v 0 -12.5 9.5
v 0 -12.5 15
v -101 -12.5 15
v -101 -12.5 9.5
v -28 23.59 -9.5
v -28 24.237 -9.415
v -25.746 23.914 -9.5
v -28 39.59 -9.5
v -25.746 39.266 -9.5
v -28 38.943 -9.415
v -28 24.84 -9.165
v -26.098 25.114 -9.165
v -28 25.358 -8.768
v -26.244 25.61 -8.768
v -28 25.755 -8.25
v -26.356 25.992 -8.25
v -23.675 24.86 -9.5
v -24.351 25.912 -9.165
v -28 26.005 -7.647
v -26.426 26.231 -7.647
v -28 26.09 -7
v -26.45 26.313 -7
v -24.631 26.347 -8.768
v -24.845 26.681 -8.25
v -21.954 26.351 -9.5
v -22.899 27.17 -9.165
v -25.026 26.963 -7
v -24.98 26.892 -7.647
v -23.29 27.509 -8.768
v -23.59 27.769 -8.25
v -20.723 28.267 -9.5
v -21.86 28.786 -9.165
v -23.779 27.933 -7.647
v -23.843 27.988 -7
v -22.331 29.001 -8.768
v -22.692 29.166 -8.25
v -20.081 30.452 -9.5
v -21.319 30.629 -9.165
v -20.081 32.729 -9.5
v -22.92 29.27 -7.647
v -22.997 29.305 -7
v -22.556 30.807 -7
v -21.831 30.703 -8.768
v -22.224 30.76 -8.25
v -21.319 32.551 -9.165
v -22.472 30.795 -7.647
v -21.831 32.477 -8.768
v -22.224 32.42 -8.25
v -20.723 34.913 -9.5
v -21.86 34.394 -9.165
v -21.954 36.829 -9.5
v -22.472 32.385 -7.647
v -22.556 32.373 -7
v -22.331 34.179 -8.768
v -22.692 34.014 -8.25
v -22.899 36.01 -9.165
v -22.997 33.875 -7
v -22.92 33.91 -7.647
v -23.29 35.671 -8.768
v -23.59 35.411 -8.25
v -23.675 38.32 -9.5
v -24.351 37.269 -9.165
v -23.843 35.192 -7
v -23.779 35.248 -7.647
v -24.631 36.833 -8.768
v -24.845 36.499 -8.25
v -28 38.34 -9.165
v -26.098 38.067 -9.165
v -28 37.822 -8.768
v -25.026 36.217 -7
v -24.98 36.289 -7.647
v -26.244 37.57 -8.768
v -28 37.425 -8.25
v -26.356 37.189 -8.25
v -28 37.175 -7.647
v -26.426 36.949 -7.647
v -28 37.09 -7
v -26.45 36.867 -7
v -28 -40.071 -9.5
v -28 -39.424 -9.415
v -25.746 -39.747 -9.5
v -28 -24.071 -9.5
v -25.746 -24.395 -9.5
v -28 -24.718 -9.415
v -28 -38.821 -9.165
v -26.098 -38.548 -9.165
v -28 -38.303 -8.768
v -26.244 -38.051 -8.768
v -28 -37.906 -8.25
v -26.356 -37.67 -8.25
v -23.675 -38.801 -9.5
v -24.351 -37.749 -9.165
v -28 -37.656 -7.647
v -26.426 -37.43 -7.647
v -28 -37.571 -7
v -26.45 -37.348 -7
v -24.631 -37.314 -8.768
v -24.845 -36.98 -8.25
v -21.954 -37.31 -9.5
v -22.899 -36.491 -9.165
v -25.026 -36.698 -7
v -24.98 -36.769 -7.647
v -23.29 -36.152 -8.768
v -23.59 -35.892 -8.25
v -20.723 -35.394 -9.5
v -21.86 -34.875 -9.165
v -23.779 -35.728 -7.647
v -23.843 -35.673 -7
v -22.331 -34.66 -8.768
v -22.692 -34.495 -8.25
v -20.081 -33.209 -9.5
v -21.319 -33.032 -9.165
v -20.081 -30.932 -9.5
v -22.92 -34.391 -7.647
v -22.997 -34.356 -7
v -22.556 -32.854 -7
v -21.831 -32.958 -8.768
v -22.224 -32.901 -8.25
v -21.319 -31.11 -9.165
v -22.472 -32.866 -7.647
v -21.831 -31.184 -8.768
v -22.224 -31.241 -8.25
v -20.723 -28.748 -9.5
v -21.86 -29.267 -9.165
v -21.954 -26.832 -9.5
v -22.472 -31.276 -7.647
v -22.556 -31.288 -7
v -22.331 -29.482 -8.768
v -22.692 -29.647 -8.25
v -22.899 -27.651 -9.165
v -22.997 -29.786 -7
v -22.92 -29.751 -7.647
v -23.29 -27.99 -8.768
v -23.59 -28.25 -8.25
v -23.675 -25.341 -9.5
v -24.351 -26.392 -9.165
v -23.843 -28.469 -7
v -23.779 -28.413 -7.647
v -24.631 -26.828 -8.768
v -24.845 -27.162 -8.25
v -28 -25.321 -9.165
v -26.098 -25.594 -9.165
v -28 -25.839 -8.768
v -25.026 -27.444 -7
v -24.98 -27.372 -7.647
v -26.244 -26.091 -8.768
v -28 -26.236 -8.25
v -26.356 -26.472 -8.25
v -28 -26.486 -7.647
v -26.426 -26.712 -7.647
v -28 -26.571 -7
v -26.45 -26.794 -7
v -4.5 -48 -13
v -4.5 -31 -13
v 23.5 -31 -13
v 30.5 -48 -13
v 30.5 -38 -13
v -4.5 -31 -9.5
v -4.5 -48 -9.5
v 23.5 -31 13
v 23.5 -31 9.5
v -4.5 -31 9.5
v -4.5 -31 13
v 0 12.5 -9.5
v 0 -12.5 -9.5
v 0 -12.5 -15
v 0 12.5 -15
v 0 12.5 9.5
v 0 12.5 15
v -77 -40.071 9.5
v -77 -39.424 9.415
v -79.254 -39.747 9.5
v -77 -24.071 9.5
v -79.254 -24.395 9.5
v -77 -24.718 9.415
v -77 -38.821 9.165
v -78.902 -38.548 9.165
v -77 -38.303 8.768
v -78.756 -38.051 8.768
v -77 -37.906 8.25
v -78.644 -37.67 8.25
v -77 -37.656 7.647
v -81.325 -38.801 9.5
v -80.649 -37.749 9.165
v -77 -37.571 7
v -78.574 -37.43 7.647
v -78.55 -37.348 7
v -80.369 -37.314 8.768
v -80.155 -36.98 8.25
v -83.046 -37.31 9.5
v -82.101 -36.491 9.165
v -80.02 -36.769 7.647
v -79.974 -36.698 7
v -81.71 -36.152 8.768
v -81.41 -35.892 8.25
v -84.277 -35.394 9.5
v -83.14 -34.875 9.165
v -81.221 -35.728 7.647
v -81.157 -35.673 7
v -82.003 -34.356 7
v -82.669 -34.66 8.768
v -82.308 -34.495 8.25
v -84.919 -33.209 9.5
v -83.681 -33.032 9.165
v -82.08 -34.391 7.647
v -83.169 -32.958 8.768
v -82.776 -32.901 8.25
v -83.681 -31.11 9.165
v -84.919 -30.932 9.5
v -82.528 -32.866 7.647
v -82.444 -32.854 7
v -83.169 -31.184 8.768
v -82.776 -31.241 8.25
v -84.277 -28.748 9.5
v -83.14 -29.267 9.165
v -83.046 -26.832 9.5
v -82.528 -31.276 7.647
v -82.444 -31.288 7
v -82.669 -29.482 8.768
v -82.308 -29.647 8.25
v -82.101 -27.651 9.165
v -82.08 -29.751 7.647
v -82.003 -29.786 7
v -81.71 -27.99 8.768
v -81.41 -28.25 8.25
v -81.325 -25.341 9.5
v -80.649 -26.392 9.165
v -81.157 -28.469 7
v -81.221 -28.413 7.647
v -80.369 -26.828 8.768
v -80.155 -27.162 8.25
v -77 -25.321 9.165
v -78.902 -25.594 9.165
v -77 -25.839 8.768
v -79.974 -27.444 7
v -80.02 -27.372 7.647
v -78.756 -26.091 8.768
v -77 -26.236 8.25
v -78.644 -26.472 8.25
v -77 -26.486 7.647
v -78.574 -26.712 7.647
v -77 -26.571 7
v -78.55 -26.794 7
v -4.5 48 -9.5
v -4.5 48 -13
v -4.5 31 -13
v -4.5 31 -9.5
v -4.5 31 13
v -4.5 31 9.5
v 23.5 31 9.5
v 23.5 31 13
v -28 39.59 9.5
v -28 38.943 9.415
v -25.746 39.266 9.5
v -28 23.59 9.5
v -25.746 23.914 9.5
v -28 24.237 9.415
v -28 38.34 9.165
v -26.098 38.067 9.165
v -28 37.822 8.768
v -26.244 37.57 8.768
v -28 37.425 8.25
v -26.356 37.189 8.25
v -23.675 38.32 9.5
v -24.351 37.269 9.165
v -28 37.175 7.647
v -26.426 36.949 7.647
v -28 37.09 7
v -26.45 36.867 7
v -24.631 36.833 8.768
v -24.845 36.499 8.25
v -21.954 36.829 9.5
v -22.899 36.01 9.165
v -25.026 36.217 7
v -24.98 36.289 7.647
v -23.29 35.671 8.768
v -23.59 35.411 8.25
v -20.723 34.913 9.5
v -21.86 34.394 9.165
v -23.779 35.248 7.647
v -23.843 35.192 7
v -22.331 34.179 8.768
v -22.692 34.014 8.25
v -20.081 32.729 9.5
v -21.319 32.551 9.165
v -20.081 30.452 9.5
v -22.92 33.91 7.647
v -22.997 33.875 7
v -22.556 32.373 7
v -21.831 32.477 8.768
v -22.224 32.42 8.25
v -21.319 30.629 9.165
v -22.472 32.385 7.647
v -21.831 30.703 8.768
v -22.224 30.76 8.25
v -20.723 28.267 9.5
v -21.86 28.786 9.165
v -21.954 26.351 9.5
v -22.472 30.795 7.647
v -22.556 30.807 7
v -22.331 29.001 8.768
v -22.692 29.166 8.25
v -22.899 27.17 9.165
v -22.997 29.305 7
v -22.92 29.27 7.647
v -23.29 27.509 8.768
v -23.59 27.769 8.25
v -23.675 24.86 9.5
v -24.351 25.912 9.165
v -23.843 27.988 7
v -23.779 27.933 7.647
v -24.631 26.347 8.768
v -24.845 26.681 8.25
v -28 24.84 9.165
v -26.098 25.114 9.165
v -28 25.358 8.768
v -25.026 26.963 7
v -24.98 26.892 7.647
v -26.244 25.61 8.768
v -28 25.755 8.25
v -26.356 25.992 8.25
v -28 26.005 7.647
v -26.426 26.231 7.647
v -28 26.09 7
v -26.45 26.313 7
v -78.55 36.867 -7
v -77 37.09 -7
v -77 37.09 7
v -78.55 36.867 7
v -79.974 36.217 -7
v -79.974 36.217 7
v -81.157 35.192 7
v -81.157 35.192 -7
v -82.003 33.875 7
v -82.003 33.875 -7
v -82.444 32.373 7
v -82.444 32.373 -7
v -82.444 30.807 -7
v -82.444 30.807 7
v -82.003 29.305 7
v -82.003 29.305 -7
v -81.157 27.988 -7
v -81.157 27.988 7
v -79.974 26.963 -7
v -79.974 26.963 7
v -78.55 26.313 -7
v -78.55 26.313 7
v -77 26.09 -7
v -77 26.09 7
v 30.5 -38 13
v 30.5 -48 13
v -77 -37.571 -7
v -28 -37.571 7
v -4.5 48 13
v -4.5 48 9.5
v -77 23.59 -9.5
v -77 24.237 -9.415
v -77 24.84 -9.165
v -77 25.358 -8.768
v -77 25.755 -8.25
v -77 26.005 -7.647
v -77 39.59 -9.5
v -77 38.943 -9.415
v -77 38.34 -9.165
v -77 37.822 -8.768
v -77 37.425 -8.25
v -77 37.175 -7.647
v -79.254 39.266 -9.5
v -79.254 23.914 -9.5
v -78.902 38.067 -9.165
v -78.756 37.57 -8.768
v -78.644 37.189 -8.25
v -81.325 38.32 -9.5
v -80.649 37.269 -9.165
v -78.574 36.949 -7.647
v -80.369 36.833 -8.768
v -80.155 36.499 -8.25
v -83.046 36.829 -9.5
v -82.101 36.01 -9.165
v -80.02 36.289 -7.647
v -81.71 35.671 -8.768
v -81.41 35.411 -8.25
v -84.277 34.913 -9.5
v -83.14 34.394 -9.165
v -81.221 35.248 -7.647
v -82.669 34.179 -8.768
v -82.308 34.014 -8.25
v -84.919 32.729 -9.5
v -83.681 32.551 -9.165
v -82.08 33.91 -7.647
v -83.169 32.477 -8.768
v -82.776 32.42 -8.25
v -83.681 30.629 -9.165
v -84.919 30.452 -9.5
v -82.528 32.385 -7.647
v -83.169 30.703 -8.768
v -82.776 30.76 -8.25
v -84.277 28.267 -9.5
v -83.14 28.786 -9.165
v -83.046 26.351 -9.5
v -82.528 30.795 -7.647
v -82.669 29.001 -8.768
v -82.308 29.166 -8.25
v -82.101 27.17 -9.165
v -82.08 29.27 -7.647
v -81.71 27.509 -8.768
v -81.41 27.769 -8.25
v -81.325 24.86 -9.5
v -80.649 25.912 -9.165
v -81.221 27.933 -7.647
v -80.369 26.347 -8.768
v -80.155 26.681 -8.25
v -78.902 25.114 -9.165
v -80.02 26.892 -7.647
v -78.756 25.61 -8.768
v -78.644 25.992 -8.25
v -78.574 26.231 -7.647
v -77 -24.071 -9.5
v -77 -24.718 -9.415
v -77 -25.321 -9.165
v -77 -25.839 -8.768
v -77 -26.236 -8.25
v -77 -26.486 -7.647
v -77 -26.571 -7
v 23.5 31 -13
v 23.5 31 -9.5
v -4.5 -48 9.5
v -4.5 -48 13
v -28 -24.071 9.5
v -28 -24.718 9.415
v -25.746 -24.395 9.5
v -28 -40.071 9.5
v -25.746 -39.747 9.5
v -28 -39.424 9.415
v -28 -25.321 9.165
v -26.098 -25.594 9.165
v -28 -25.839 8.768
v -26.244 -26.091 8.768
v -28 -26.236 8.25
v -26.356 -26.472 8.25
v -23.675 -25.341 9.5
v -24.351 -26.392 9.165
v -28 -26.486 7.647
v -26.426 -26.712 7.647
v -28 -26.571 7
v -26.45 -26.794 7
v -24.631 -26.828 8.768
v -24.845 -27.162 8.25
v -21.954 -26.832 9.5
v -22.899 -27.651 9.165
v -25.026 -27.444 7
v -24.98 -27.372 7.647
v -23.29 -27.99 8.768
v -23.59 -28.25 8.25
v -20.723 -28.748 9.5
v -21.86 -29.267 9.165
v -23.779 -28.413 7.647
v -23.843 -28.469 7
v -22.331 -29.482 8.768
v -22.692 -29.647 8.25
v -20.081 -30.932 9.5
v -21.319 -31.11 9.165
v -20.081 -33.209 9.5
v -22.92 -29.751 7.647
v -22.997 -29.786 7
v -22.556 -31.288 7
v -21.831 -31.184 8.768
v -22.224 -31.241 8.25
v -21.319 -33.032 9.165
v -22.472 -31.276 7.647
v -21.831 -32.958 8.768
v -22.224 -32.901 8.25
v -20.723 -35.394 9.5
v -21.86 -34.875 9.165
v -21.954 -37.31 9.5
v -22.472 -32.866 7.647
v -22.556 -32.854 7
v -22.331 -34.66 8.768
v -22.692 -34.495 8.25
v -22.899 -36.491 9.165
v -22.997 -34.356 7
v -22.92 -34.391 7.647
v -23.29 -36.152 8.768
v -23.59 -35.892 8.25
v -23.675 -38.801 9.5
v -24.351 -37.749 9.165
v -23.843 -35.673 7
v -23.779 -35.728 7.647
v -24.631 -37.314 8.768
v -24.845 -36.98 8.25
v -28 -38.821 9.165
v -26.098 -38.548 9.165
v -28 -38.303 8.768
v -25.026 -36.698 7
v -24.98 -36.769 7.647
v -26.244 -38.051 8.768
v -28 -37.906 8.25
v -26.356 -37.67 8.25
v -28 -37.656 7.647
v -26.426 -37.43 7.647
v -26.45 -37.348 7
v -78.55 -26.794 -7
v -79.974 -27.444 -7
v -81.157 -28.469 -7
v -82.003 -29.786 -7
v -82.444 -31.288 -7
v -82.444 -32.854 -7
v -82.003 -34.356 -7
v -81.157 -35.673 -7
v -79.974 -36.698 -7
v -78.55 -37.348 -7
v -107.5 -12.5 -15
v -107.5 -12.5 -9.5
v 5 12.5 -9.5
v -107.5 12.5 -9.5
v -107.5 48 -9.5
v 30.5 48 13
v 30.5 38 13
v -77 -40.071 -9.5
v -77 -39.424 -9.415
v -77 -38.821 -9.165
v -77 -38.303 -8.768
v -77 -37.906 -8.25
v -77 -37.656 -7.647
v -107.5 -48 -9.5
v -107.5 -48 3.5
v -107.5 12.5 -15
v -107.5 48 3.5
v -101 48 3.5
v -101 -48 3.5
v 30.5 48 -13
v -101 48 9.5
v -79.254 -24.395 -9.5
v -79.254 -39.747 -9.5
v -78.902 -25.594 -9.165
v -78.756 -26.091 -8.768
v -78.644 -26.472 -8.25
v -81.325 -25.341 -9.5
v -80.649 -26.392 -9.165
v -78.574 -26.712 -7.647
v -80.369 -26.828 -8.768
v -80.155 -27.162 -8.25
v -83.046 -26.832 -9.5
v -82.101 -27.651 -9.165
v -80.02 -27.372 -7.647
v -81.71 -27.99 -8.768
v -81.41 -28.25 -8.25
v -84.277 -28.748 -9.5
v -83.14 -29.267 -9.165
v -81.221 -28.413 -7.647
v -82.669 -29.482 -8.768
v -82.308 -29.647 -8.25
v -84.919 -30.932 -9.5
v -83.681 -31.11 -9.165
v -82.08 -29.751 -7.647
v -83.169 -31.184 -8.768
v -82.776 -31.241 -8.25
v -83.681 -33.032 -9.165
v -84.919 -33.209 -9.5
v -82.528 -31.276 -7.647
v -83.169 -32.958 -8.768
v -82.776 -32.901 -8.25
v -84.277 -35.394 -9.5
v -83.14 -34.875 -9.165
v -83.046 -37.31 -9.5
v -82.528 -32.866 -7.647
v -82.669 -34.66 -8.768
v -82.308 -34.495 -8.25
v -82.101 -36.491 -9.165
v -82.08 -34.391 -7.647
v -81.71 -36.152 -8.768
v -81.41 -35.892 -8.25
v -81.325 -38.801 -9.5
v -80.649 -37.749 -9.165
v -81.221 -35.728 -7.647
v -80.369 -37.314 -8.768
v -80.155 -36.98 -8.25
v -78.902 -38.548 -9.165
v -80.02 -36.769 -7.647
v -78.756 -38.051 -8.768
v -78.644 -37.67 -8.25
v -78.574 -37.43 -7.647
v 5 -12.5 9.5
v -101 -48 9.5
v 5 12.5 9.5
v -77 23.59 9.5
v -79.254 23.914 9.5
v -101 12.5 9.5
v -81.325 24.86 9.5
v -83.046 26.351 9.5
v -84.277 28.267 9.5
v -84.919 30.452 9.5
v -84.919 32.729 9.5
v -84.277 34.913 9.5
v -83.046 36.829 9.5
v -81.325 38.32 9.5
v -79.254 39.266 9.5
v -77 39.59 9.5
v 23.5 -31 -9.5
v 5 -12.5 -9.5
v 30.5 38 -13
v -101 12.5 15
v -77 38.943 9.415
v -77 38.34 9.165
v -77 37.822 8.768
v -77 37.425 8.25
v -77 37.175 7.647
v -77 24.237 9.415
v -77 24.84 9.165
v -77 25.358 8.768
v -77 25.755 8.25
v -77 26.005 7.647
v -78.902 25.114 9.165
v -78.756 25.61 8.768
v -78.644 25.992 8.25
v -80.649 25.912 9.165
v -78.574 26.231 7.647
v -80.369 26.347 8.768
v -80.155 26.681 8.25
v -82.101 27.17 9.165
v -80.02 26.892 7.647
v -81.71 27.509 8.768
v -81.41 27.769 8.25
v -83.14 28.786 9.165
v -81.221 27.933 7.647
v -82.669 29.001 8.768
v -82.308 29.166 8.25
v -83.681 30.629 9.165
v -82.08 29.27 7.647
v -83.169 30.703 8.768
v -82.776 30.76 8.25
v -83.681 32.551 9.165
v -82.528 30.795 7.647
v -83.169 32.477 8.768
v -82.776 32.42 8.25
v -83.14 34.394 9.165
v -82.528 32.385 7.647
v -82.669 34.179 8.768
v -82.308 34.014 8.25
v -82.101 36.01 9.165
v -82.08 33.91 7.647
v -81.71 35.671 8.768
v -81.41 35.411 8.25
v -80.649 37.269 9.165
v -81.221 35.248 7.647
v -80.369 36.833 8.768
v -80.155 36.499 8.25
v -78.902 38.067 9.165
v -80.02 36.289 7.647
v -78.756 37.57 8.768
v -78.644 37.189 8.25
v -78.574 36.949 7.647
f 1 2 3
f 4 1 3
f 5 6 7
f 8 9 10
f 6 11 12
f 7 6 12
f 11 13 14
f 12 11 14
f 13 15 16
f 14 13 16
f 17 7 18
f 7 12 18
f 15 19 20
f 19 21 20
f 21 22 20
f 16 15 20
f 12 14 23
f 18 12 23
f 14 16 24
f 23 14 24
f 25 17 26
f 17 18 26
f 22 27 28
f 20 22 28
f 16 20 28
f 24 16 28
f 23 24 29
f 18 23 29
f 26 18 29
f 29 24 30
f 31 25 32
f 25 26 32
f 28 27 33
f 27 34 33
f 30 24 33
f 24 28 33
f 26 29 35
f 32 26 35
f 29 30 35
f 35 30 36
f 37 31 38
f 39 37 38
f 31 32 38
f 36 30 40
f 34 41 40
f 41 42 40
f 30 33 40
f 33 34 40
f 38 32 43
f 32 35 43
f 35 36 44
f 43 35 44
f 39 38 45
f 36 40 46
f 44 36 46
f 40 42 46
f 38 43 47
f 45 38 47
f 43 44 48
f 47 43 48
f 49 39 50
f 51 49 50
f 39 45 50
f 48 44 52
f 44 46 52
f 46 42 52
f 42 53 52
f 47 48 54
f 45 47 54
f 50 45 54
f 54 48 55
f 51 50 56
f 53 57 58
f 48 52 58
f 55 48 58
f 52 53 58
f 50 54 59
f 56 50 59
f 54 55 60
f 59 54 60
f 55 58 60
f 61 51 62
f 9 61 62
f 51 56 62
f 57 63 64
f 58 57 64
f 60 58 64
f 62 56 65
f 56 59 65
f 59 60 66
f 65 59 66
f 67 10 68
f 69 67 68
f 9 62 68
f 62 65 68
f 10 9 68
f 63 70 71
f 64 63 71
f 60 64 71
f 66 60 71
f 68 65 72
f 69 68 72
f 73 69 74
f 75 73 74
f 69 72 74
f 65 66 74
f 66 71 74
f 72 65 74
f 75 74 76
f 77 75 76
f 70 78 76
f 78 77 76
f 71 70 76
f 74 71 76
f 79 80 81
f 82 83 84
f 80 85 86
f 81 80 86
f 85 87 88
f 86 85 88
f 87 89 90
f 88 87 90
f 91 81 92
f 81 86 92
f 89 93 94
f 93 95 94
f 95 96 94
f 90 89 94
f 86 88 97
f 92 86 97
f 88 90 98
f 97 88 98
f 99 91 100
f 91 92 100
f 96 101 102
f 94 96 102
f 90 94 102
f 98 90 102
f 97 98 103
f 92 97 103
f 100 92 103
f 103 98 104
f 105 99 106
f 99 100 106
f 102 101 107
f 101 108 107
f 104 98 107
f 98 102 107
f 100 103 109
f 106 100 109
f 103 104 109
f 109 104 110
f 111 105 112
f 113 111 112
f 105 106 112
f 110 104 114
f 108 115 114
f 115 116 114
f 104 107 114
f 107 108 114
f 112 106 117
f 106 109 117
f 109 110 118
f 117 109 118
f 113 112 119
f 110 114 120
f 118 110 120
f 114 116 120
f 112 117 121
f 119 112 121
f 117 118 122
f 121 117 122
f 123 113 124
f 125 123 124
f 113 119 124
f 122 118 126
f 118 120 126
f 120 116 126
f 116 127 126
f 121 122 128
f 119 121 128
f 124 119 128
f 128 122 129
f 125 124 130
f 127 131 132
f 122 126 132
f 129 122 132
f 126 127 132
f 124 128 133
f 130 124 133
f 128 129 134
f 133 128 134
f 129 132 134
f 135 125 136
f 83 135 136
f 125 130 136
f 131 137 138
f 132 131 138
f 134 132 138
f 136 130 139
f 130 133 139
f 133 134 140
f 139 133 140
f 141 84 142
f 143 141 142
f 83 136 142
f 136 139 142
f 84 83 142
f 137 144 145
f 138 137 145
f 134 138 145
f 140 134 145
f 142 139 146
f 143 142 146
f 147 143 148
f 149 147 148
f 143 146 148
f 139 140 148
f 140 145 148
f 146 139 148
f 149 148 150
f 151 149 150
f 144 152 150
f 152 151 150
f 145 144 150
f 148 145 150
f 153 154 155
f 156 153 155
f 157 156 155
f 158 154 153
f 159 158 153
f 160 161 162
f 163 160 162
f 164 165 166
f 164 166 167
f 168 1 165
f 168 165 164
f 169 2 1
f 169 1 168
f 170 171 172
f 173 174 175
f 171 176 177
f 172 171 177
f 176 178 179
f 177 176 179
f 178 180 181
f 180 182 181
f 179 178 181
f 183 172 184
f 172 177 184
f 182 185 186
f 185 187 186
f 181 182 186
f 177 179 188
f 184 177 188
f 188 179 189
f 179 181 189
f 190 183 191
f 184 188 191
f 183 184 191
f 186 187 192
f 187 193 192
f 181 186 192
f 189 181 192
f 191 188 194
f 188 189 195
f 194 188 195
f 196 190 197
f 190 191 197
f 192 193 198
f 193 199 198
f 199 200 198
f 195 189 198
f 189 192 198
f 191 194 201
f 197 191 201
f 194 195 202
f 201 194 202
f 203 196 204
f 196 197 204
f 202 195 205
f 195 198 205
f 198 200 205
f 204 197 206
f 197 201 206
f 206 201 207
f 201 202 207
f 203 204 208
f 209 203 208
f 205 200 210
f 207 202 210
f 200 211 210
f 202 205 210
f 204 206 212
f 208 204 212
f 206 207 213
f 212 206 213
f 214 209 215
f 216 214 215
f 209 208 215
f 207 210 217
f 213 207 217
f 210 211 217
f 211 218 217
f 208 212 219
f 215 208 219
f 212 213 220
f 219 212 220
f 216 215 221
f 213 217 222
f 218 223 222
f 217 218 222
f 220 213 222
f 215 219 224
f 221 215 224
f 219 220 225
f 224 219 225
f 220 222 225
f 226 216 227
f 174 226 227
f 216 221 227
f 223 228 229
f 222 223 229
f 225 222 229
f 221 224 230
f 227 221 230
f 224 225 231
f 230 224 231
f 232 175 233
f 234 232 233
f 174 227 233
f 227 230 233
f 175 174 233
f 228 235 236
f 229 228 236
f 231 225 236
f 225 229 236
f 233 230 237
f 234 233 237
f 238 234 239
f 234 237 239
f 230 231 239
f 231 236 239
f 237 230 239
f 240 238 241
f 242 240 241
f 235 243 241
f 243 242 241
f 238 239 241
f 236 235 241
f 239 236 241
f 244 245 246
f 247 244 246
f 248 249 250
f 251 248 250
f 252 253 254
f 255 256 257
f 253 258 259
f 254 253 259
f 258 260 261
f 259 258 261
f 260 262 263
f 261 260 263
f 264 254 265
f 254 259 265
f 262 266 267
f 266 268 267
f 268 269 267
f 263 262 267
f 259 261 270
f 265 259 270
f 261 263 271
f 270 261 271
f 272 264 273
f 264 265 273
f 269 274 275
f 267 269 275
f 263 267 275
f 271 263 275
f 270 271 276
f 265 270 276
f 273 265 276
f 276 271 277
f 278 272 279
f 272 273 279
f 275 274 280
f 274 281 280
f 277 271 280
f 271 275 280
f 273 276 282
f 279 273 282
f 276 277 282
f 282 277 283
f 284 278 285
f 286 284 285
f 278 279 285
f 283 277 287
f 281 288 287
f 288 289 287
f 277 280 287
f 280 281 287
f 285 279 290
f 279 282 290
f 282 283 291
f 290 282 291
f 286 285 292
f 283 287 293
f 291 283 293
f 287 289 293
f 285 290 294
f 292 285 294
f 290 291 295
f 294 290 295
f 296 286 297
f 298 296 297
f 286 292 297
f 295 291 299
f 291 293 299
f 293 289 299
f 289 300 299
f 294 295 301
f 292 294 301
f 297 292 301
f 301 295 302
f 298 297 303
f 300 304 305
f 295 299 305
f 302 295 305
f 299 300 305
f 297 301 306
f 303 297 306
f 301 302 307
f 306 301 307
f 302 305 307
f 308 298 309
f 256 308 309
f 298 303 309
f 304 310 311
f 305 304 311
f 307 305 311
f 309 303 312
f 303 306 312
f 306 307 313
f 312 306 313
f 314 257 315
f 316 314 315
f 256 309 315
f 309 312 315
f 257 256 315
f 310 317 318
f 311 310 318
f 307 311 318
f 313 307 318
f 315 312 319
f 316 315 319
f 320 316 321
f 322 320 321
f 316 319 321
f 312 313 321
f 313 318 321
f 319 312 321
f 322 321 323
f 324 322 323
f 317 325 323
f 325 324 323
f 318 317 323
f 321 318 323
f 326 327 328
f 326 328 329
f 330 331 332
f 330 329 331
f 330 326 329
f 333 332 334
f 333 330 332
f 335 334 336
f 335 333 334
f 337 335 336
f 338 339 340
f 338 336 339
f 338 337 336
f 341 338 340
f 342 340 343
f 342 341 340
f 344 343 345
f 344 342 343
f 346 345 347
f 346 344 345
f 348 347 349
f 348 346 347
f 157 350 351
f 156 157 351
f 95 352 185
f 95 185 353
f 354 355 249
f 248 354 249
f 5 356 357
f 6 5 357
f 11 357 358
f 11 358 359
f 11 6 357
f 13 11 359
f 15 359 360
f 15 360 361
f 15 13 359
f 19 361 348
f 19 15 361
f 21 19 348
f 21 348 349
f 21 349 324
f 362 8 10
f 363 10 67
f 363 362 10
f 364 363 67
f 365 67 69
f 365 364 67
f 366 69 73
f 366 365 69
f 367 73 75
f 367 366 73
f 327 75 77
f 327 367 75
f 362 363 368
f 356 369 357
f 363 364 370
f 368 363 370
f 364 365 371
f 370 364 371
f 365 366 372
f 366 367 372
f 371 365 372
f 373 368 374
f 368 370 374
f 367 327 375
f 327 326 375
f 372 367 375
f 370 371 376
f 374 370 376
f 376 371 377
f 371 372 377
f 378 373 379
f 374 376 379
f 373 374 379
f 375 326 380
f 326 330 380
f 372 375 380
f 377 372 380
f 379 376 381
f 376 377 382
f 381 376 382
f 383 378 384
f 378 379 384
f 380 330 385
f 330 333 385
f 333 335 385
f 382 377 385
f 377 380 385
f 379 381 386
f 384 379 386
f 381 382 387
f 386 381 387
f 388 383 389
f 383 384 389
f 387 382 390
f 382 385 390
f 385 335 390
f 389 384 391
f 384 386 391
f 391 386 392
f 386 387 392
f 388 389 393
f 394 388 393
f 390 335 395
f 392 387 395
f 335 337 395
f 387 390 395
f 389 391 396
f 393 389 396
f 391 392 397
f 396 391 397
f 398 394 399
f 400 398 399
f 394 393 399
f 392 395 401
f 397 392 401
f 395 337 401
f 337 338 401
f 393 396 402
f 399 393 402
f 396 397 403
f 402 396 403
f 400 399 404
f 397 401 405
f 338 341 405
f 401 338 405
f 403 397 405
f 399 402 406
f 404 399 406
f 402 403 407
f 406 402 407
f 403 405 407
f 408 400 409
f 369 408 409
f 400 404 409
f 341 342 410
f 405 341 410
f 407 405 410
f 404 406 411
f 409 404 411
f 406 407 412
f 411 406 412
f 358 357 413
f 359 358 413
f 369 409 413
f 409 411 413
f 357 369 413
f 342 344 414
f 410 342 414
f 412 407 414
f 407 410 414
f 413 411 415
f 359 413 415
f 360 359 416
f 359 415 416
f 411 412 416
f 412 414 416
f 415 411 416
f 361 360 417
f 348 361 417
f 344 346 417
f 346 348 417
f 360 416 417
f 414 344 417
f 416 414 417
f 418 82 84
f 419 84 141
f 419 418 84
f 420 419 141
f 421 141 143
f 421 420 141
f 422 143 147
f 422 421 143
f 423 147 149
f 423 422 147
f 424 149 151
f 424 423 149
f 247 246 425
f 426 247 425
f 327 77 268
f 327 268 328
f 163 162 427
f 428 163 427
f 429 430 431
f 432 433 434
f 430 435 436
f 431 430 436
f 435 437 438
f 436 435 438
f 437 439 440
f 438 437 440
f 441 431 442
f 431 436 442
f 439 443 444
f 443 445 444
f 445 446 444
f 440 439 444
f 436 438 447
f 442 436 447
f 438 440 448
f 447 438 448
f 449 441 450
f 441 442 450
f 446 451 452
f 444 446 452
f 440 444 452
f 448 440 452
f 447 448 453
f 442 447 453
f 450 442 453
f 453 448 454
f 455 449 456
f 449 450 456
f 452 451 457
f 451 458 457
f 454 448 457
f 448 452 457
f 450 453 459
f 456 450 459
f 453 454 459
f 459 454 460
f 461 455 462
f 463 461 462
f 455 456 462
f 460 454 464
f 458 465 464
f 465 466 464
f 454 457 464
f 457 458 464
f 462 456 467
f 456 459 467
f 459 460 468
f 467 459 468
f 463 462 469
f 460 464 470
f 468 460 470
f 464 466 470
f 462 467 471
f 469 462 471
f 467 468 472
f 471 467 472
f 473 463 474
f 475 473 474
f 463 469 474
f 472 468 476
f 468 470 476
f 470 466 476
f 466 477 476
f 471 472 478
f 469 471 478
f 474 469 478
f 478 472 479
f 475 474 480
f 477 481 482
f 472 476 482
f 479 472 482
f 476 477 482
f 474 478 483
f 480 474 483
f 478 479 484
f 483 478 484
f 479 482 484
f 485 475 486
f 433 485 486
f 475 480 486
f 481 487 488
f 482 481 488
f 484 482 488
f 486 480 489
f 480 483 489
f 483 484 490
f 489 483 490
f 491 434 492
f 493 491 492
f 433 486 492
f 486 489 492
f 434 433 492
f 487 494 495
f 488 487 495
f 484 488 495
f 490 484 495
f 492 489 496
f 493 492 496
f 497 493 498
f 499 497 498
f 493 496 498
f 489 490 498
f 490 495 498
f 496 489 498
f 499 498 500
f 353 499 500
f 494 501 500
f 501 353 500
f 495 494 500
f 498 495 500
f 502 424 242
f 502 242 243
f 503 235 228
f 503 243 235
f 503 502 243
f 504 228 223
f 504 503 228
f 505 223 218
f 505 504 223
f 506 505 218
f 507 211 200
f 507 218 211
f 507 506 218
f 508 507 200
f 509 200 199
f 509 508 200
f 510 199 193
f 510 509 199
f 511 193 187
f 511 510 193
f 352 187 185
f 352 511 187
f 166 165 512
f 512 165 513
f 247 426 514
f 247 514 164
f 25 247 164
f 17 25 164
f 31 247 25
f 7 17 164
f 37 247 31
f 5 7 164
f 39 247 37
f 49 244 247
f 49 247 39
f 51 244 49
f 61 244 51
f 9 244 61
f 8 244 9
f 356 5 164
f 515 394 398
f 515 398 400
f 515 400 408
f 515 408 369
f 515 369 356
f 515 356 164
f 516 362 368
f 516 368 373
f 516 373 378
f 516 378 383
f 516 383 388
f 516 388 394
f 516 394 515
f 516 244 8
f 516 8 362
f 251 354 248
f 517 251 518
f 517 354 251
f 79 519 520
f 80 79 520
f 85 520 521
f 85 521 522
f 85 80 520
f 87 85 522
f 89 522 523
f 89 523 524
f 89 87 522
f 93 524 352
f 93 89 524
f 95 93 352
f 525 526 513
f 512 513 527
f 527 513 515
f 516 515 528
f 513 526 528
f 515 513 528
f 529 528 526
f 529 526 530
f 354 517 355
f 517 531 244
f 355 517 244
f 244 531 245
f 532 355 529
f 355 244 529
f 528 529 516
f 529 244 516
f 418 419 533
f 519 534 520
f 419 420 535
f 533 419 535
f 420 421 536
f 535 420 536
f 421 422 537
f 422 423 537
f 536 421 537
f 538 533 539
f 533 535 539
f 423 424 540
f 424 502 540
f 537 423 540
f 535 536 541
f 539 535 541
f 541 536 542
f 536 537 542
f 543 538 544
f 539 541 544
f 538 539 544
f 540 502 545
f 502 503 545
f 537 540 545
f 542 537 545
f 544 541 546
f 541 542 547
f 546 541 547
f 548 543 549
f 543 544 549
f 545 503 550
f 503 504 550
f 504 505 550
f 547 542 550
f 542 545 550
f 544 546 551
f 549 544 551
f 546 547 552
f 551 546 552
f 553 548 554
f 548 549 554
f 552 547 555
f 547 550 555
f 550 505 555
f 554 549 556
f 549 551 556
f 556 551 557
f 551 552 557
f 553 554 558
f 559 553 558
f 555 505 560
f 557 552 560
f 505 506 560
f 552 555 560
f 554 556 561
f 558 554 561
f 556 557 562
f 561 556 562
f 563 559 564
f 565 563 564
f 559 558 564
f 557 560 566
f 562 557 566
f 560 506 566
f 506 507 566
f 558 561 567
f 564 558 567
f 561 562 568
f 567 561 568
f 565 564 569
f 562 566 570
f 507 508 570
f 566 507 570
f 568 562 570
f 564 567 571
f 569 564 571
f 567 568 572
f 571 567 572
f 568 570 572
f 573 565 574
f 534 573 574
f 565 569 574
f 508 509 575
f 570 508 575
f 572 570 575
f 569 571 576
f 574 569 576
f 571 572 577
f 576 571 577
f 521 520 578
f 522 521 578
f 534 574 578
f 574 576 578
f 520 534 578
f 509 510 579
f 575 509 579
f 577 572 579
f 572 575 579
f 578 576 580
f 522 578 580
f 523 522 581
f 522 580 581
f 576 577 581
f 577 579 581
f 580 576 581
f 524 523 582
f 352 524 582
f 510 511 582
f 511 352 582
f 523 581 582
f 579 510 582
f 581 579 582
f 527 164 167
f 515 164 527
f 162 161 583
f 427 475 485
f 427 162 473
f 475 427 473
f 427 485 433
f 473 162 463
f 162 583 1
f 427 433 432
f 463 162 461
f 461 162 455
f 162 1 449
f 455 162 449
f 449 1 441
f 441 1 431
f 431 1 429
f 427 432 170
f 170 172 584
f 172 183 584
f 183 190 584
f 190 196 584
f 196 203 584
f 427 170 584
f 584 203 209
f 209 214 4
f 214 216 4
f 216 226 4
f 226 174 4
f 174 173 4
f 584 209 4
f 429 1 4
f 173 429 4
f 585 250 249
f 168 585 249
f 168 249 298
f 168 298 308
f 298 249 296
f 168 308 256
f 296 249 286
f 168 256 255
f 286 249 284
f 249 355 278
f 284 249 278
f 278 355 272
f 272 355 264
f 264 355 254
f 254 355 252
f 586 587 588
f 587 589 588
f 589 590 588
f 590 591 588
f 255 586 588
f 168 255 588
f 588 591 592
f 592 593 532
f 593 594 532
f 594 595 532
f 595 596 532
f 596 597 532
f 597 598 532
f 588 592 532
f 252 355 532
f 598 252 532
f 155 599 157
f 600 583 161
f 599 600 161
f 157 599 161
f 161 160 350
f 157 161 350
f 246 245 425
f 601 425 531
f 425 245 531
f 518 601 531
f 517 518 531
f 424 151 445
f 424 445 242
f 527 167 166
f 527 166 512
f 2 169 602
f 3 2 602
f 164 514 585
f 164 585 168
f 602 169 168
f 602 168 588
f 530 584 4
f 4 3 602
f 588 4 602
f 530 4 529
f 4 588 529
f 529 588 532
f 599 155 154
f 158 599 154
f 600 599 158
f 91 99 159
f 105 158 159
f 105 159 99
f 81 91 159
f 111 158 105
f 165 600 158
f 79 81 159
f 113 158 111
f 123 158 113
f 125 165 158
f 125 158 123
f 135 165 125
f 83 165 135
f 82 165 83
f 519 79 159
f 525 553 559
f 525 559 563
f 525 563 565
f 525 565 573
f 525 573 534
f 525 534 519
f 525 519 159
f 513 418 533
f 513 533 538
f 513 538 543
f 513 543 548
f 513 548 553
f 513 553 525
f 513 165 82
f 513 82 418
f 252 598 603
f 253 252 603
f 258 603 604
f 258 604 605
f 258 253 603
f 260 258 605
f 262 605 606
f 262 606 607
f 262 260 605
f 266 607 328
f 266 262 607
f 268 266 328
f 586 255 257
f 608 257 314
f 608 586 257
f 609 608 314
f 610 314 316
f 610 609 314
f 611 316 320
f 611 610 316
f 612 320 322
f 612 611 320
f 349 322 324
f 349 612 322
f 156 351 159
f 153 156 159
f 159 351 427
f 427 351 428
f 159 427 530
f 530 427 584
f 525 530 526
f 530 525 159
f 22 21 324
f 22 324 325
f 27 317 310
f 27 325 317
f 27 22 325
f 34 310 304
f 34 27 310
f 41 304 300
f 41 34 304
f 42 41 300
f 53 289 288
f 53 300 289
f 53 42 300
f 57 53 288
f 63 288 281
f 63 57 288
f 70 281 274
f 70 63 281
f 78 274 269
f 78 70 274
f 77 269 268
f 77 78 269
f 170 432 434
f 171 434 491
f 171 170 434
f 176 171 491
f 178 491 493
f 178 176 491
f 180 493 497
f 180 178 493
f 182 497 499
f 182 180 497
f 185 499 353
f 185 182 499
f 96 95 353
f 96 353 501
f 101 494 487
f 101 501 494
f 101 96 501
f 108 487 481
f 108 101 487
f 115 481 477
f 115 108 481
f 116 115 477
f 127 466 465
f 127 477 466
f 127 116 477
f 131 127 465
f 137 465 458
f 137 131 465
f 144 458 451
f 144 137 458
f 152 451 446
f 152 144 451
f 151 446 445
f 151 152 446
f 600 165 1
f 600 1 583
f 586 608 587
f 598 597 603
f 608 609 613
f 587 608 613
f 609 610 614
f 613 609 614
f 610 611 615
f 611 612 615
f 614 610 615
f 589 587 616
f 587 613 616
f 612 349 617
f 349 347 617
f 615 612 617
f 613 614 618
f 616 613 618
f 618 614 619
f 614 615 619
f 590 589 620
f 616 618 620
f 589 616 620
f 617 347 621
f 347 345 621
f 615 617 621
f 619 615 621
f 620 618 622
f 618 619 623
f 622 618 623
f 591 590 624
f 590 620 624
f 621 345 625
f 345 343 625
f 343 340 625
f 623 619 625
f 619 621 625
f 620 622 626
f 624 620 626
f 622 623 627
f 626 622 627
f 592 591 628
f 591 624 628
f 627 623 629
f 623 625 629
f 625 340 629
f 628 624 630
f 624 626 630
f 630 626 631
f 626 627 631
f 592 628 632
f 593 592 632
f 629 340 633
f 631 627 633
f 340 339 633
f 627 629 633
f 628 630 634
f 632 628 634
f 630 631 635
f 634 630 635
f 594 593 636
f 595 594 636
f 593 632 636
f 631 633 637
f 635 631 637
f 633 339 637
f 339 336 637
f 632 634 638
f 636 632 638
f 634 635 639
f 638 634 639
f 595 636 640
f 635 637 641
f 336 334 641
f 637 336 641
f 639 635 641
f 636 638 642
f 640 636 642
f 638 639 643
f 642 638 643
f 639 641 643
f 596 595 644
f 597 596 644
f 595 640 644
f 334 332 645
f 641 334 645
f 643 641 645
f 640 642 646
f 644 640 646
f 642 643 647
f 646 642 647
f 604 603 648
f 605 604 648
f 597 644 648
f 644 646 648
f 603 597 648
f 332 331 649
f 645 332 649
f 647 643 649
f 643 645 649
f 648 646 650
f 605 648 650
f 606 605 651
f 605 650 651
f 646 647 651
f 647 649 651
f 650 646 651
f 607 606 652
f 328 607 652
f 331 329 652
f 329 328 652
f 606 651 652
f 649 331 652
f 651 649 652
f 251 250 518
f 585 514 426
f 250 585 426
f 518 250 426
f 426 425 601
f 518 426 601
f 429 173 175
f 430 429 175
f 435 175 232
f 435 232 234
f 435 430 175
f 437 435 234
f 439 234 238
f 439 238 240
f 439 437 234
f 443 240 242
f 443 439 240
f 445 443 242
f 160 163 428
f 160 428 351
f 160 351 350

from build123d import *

# Parameters (mm, degrees)
EXTRUDE_1_DEPTH      = 9.5
EXTRUDE_2_DEPTH      = 3.5
EXTRUDE_2_DEPTH_BACK = 22.5
EXTRUDE_3_DEPTH      = 5.5
EXTRUDE_3_DEPTH_BACK = 24.5
SKETCH_8_W           = 107.5
SKETCH_8_H           = 25
SKETCH_9_W           = 6.5
SKETCH_9_H           = 96
CUT_EXTRUDE_1_DEPTH  = 11.5
CUT_EXTRUDE_2_DEPTH  = 52.5
FILLET_1_R           = 2.5


with BuildPart() as part:
    # 草图1 → 凸台-拉伸1 (new, symmetric)
    with BuildSketch(Plane.XY):
        Polygon((-107.5, 48), (30.5, 48), (30.5, 38), (5, 12.5), (0, 12.5), (0, -12.5), (5, -12.5), (30.5, -38), (30.5, -48), (-107.5, -48), align=None)
    extrude(amount=EXTRUDE_1_DEPTH, both=True)

    # 草图2 → 凸台-拉伸2 (add, two sides: drawn at the far end of the back side and taken through both)
    with BuildSketch(Plane.XY.offset(9.5).offset(-EXTRUDE_2_DEPTH_BACK)):
        Polygon((-4.5, 31), (23.5, 31), (30.5, 38), (30.5, 48), (-4.5, 48), align=None)
        Polygon((30.5, -38), (23.5, -31), (-4.5, -31), (-4.5, -48), (30.5, -48), align=None)
    extrude(amount=EXTRUDE_2_DEPTH + EXTRUDE_2_DEPTH_BACK)

    # 草图8 → 凸台-拉伸3 (add, two sides: drawn at the far end of the back side and taken through both)
    with BuildSketch(Plane(origin=(0, 0, -9.5), x_dir=(-1, 0, 0), z_dir=(0, 0, -1)).offset(-EXTRUDE_3_DEPTH_BACK)):
        with Locations((53.75, 0)):
            Rectangle(SKETCH_8_W, SKETCH_8_H)
    extrude(amount=EXTRUDE_3_DEPTH + EXTRUDE_3_DEPTH_BACK)

    # 草图9 → 切除-拉伸1 (cut)
    with BuildSketch(Plane.XY.offset(15)):
        with Locations((-104.25, 0)):
            Rectangle(SKETCH_9_W, SKETCH_9_H)
    extrude(amount=-CUT_EXTRUDE_1_DEPTH, mode=Mode.SUBTRACT)

    # 草图11 → 切除-拉伸2 (cut)
    with BuildSketch(Plane(origin=(0, 0, -9.5), x_dir=(-1, 0, 0), z_dir=(0, 0, -1))):
        with BuildLine():
            Line((28, 37.09009956), (77, 37.09009956))
            ThreePointArc((77, 37.09009956), (82.5, 31.59009956), (77, 26.09009956))
            Line((77, 26.09009956), (28, 26.09009956))
            ThreePointArc((28, 26.09009956), (22.5, 31.59009956), (28, 37.09009956))
        make_face()
        with BuildLine():
            Line((28, -26.570922994), (77, -26.570922994))
            ThreePointArc((77, -26.570922994), (82.5, -32.070922994), (77, -37.570922994))
            Line((77, -37.570922994), (28, -37.570922994))
            ThreePointArc((28, -37.570922994), (22.5, -32.070922994), (28, -26.570922994))
        make_face()
    extrude(amount=-CUT_EXTRUDE_2_DEPTH, mode=Mode.SUBTRACT)

    # 圆角1
    fillet_1_edges = [part.edges().sort_by_distance(p)[0] for p in [
        (-22.5, 31.59009956, 9.5),
        (-52.5, 37.09009956, 9.5),
        (-82.5, 31.59009956, 9.5),
        (-52.5, 26.09009956, 9.5),
        (-22.5, 31.59009956, -9.5),
        (-52.5, 26.09009956, -9.5),
        (-82.5, 31.59009956, -9.5),
        (-52.5, 37.09009956, -9.5),
        (-22.5, -32.070922994, 9.5),
        (-52.5, -26.570922994, 9.5),
        (-82.5, -32.070922994, 9.5),
        (-52.5, -37.570922994, 9.5),
        (-22.5, -32.070922994, -9.5),
        (-52.5, -37.570922994, -9.5),
        (-82.5, -32.070922994, -9.5),
        (-52.5, -26.570922994, -9.5),
    ]]
    fillet(fillet_1_edges, radius=FILLET_1_R)


solid = part.part
